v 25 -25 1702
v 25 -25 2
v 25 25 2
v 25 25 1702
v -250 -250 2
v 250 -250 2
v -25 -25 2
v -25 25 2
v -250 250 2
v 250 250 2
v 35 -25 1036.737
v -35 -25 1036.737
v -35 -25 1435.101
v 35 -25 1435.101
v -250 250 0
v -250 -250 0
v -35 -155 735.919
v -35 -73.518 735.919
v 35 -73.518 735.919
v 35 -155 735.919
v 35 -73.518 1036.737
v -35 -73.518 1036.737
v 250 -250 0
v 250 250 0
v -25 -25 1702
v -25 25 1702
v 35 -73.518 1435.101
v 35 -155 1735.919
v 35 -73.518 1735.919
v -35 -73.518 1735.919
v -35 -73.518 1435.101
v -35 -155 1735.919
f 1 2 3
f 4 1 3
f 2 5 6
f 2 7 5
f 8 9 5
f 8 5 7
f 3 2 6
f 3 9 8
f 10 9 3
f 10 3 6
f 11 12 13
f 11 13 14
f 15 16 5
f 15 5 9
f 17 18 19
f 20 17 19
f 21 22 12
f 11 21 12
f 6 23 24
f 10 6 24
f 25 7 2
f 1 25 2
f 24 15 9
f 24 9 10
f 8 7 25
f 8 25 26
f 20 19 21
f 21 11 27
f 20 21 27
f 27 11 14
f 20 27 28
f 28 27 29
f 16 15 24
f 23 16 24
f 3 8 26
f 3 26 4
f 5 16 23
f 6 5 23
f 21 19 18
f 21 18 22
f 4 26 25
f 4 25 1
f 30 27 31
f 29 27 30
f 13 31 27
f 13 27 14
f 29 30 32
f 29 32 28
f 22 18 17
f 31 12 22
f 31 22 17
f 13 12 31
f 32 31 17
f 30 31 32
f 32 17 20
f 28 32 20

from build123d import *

# Parameters (mm, degrees)
F0_W     = 500
F0_H     = 500
F1_DEPTH = 2
F2_W     = 50
F2_H     = 50
F3_DEPTH = 1700
F4_W     = 70
F4_H     = 1000
F5_DEPTH = 130
F6_W     = 48.5175982118
F6_H     = 300.8179664612
F7_DEPTH = 285.001


with BuildPart() as f1:
    # F0 (on Top) → F1 (new body)
    with BuildSketch(Plane.XY):
        Rectangle(F0_W, F0_H)
    extrude(amount=F1_DEPTH)

    # F2 (on face) → F3 (join)
    with BuildSketch(Plane.XY.offset(2)):
        Rectangle(F2_W, F2_H)
    extrude(amount=F3_DEPTH)


with BuildPart() as f5:
    # F4 (on face) → F5 (new body)
    with BuildSketch(Plane.XZ.offset(25)):
        with Locations((0, 1235.9191179276)):
            Rectangle(F4_W, F4_H)
    extrude(amount=F5_DEPTH)

    # F6 (on face) → F7 (cut, through all)
    with BuildSketch(Plane.YZ.offset(35)):
        with Locations((-49.2587991059, 1585.510134697)):
            Rectangle(F6_W, F6_H)
        with Locations((-49.2587991059, 886.3281011581)):
            Rectangle(F6_W, F6_H)
    extrude(amount=-F7_DEPTH, mode=Mode.SUBTRACT)


solid = Compound([f1.part, f5.part])
